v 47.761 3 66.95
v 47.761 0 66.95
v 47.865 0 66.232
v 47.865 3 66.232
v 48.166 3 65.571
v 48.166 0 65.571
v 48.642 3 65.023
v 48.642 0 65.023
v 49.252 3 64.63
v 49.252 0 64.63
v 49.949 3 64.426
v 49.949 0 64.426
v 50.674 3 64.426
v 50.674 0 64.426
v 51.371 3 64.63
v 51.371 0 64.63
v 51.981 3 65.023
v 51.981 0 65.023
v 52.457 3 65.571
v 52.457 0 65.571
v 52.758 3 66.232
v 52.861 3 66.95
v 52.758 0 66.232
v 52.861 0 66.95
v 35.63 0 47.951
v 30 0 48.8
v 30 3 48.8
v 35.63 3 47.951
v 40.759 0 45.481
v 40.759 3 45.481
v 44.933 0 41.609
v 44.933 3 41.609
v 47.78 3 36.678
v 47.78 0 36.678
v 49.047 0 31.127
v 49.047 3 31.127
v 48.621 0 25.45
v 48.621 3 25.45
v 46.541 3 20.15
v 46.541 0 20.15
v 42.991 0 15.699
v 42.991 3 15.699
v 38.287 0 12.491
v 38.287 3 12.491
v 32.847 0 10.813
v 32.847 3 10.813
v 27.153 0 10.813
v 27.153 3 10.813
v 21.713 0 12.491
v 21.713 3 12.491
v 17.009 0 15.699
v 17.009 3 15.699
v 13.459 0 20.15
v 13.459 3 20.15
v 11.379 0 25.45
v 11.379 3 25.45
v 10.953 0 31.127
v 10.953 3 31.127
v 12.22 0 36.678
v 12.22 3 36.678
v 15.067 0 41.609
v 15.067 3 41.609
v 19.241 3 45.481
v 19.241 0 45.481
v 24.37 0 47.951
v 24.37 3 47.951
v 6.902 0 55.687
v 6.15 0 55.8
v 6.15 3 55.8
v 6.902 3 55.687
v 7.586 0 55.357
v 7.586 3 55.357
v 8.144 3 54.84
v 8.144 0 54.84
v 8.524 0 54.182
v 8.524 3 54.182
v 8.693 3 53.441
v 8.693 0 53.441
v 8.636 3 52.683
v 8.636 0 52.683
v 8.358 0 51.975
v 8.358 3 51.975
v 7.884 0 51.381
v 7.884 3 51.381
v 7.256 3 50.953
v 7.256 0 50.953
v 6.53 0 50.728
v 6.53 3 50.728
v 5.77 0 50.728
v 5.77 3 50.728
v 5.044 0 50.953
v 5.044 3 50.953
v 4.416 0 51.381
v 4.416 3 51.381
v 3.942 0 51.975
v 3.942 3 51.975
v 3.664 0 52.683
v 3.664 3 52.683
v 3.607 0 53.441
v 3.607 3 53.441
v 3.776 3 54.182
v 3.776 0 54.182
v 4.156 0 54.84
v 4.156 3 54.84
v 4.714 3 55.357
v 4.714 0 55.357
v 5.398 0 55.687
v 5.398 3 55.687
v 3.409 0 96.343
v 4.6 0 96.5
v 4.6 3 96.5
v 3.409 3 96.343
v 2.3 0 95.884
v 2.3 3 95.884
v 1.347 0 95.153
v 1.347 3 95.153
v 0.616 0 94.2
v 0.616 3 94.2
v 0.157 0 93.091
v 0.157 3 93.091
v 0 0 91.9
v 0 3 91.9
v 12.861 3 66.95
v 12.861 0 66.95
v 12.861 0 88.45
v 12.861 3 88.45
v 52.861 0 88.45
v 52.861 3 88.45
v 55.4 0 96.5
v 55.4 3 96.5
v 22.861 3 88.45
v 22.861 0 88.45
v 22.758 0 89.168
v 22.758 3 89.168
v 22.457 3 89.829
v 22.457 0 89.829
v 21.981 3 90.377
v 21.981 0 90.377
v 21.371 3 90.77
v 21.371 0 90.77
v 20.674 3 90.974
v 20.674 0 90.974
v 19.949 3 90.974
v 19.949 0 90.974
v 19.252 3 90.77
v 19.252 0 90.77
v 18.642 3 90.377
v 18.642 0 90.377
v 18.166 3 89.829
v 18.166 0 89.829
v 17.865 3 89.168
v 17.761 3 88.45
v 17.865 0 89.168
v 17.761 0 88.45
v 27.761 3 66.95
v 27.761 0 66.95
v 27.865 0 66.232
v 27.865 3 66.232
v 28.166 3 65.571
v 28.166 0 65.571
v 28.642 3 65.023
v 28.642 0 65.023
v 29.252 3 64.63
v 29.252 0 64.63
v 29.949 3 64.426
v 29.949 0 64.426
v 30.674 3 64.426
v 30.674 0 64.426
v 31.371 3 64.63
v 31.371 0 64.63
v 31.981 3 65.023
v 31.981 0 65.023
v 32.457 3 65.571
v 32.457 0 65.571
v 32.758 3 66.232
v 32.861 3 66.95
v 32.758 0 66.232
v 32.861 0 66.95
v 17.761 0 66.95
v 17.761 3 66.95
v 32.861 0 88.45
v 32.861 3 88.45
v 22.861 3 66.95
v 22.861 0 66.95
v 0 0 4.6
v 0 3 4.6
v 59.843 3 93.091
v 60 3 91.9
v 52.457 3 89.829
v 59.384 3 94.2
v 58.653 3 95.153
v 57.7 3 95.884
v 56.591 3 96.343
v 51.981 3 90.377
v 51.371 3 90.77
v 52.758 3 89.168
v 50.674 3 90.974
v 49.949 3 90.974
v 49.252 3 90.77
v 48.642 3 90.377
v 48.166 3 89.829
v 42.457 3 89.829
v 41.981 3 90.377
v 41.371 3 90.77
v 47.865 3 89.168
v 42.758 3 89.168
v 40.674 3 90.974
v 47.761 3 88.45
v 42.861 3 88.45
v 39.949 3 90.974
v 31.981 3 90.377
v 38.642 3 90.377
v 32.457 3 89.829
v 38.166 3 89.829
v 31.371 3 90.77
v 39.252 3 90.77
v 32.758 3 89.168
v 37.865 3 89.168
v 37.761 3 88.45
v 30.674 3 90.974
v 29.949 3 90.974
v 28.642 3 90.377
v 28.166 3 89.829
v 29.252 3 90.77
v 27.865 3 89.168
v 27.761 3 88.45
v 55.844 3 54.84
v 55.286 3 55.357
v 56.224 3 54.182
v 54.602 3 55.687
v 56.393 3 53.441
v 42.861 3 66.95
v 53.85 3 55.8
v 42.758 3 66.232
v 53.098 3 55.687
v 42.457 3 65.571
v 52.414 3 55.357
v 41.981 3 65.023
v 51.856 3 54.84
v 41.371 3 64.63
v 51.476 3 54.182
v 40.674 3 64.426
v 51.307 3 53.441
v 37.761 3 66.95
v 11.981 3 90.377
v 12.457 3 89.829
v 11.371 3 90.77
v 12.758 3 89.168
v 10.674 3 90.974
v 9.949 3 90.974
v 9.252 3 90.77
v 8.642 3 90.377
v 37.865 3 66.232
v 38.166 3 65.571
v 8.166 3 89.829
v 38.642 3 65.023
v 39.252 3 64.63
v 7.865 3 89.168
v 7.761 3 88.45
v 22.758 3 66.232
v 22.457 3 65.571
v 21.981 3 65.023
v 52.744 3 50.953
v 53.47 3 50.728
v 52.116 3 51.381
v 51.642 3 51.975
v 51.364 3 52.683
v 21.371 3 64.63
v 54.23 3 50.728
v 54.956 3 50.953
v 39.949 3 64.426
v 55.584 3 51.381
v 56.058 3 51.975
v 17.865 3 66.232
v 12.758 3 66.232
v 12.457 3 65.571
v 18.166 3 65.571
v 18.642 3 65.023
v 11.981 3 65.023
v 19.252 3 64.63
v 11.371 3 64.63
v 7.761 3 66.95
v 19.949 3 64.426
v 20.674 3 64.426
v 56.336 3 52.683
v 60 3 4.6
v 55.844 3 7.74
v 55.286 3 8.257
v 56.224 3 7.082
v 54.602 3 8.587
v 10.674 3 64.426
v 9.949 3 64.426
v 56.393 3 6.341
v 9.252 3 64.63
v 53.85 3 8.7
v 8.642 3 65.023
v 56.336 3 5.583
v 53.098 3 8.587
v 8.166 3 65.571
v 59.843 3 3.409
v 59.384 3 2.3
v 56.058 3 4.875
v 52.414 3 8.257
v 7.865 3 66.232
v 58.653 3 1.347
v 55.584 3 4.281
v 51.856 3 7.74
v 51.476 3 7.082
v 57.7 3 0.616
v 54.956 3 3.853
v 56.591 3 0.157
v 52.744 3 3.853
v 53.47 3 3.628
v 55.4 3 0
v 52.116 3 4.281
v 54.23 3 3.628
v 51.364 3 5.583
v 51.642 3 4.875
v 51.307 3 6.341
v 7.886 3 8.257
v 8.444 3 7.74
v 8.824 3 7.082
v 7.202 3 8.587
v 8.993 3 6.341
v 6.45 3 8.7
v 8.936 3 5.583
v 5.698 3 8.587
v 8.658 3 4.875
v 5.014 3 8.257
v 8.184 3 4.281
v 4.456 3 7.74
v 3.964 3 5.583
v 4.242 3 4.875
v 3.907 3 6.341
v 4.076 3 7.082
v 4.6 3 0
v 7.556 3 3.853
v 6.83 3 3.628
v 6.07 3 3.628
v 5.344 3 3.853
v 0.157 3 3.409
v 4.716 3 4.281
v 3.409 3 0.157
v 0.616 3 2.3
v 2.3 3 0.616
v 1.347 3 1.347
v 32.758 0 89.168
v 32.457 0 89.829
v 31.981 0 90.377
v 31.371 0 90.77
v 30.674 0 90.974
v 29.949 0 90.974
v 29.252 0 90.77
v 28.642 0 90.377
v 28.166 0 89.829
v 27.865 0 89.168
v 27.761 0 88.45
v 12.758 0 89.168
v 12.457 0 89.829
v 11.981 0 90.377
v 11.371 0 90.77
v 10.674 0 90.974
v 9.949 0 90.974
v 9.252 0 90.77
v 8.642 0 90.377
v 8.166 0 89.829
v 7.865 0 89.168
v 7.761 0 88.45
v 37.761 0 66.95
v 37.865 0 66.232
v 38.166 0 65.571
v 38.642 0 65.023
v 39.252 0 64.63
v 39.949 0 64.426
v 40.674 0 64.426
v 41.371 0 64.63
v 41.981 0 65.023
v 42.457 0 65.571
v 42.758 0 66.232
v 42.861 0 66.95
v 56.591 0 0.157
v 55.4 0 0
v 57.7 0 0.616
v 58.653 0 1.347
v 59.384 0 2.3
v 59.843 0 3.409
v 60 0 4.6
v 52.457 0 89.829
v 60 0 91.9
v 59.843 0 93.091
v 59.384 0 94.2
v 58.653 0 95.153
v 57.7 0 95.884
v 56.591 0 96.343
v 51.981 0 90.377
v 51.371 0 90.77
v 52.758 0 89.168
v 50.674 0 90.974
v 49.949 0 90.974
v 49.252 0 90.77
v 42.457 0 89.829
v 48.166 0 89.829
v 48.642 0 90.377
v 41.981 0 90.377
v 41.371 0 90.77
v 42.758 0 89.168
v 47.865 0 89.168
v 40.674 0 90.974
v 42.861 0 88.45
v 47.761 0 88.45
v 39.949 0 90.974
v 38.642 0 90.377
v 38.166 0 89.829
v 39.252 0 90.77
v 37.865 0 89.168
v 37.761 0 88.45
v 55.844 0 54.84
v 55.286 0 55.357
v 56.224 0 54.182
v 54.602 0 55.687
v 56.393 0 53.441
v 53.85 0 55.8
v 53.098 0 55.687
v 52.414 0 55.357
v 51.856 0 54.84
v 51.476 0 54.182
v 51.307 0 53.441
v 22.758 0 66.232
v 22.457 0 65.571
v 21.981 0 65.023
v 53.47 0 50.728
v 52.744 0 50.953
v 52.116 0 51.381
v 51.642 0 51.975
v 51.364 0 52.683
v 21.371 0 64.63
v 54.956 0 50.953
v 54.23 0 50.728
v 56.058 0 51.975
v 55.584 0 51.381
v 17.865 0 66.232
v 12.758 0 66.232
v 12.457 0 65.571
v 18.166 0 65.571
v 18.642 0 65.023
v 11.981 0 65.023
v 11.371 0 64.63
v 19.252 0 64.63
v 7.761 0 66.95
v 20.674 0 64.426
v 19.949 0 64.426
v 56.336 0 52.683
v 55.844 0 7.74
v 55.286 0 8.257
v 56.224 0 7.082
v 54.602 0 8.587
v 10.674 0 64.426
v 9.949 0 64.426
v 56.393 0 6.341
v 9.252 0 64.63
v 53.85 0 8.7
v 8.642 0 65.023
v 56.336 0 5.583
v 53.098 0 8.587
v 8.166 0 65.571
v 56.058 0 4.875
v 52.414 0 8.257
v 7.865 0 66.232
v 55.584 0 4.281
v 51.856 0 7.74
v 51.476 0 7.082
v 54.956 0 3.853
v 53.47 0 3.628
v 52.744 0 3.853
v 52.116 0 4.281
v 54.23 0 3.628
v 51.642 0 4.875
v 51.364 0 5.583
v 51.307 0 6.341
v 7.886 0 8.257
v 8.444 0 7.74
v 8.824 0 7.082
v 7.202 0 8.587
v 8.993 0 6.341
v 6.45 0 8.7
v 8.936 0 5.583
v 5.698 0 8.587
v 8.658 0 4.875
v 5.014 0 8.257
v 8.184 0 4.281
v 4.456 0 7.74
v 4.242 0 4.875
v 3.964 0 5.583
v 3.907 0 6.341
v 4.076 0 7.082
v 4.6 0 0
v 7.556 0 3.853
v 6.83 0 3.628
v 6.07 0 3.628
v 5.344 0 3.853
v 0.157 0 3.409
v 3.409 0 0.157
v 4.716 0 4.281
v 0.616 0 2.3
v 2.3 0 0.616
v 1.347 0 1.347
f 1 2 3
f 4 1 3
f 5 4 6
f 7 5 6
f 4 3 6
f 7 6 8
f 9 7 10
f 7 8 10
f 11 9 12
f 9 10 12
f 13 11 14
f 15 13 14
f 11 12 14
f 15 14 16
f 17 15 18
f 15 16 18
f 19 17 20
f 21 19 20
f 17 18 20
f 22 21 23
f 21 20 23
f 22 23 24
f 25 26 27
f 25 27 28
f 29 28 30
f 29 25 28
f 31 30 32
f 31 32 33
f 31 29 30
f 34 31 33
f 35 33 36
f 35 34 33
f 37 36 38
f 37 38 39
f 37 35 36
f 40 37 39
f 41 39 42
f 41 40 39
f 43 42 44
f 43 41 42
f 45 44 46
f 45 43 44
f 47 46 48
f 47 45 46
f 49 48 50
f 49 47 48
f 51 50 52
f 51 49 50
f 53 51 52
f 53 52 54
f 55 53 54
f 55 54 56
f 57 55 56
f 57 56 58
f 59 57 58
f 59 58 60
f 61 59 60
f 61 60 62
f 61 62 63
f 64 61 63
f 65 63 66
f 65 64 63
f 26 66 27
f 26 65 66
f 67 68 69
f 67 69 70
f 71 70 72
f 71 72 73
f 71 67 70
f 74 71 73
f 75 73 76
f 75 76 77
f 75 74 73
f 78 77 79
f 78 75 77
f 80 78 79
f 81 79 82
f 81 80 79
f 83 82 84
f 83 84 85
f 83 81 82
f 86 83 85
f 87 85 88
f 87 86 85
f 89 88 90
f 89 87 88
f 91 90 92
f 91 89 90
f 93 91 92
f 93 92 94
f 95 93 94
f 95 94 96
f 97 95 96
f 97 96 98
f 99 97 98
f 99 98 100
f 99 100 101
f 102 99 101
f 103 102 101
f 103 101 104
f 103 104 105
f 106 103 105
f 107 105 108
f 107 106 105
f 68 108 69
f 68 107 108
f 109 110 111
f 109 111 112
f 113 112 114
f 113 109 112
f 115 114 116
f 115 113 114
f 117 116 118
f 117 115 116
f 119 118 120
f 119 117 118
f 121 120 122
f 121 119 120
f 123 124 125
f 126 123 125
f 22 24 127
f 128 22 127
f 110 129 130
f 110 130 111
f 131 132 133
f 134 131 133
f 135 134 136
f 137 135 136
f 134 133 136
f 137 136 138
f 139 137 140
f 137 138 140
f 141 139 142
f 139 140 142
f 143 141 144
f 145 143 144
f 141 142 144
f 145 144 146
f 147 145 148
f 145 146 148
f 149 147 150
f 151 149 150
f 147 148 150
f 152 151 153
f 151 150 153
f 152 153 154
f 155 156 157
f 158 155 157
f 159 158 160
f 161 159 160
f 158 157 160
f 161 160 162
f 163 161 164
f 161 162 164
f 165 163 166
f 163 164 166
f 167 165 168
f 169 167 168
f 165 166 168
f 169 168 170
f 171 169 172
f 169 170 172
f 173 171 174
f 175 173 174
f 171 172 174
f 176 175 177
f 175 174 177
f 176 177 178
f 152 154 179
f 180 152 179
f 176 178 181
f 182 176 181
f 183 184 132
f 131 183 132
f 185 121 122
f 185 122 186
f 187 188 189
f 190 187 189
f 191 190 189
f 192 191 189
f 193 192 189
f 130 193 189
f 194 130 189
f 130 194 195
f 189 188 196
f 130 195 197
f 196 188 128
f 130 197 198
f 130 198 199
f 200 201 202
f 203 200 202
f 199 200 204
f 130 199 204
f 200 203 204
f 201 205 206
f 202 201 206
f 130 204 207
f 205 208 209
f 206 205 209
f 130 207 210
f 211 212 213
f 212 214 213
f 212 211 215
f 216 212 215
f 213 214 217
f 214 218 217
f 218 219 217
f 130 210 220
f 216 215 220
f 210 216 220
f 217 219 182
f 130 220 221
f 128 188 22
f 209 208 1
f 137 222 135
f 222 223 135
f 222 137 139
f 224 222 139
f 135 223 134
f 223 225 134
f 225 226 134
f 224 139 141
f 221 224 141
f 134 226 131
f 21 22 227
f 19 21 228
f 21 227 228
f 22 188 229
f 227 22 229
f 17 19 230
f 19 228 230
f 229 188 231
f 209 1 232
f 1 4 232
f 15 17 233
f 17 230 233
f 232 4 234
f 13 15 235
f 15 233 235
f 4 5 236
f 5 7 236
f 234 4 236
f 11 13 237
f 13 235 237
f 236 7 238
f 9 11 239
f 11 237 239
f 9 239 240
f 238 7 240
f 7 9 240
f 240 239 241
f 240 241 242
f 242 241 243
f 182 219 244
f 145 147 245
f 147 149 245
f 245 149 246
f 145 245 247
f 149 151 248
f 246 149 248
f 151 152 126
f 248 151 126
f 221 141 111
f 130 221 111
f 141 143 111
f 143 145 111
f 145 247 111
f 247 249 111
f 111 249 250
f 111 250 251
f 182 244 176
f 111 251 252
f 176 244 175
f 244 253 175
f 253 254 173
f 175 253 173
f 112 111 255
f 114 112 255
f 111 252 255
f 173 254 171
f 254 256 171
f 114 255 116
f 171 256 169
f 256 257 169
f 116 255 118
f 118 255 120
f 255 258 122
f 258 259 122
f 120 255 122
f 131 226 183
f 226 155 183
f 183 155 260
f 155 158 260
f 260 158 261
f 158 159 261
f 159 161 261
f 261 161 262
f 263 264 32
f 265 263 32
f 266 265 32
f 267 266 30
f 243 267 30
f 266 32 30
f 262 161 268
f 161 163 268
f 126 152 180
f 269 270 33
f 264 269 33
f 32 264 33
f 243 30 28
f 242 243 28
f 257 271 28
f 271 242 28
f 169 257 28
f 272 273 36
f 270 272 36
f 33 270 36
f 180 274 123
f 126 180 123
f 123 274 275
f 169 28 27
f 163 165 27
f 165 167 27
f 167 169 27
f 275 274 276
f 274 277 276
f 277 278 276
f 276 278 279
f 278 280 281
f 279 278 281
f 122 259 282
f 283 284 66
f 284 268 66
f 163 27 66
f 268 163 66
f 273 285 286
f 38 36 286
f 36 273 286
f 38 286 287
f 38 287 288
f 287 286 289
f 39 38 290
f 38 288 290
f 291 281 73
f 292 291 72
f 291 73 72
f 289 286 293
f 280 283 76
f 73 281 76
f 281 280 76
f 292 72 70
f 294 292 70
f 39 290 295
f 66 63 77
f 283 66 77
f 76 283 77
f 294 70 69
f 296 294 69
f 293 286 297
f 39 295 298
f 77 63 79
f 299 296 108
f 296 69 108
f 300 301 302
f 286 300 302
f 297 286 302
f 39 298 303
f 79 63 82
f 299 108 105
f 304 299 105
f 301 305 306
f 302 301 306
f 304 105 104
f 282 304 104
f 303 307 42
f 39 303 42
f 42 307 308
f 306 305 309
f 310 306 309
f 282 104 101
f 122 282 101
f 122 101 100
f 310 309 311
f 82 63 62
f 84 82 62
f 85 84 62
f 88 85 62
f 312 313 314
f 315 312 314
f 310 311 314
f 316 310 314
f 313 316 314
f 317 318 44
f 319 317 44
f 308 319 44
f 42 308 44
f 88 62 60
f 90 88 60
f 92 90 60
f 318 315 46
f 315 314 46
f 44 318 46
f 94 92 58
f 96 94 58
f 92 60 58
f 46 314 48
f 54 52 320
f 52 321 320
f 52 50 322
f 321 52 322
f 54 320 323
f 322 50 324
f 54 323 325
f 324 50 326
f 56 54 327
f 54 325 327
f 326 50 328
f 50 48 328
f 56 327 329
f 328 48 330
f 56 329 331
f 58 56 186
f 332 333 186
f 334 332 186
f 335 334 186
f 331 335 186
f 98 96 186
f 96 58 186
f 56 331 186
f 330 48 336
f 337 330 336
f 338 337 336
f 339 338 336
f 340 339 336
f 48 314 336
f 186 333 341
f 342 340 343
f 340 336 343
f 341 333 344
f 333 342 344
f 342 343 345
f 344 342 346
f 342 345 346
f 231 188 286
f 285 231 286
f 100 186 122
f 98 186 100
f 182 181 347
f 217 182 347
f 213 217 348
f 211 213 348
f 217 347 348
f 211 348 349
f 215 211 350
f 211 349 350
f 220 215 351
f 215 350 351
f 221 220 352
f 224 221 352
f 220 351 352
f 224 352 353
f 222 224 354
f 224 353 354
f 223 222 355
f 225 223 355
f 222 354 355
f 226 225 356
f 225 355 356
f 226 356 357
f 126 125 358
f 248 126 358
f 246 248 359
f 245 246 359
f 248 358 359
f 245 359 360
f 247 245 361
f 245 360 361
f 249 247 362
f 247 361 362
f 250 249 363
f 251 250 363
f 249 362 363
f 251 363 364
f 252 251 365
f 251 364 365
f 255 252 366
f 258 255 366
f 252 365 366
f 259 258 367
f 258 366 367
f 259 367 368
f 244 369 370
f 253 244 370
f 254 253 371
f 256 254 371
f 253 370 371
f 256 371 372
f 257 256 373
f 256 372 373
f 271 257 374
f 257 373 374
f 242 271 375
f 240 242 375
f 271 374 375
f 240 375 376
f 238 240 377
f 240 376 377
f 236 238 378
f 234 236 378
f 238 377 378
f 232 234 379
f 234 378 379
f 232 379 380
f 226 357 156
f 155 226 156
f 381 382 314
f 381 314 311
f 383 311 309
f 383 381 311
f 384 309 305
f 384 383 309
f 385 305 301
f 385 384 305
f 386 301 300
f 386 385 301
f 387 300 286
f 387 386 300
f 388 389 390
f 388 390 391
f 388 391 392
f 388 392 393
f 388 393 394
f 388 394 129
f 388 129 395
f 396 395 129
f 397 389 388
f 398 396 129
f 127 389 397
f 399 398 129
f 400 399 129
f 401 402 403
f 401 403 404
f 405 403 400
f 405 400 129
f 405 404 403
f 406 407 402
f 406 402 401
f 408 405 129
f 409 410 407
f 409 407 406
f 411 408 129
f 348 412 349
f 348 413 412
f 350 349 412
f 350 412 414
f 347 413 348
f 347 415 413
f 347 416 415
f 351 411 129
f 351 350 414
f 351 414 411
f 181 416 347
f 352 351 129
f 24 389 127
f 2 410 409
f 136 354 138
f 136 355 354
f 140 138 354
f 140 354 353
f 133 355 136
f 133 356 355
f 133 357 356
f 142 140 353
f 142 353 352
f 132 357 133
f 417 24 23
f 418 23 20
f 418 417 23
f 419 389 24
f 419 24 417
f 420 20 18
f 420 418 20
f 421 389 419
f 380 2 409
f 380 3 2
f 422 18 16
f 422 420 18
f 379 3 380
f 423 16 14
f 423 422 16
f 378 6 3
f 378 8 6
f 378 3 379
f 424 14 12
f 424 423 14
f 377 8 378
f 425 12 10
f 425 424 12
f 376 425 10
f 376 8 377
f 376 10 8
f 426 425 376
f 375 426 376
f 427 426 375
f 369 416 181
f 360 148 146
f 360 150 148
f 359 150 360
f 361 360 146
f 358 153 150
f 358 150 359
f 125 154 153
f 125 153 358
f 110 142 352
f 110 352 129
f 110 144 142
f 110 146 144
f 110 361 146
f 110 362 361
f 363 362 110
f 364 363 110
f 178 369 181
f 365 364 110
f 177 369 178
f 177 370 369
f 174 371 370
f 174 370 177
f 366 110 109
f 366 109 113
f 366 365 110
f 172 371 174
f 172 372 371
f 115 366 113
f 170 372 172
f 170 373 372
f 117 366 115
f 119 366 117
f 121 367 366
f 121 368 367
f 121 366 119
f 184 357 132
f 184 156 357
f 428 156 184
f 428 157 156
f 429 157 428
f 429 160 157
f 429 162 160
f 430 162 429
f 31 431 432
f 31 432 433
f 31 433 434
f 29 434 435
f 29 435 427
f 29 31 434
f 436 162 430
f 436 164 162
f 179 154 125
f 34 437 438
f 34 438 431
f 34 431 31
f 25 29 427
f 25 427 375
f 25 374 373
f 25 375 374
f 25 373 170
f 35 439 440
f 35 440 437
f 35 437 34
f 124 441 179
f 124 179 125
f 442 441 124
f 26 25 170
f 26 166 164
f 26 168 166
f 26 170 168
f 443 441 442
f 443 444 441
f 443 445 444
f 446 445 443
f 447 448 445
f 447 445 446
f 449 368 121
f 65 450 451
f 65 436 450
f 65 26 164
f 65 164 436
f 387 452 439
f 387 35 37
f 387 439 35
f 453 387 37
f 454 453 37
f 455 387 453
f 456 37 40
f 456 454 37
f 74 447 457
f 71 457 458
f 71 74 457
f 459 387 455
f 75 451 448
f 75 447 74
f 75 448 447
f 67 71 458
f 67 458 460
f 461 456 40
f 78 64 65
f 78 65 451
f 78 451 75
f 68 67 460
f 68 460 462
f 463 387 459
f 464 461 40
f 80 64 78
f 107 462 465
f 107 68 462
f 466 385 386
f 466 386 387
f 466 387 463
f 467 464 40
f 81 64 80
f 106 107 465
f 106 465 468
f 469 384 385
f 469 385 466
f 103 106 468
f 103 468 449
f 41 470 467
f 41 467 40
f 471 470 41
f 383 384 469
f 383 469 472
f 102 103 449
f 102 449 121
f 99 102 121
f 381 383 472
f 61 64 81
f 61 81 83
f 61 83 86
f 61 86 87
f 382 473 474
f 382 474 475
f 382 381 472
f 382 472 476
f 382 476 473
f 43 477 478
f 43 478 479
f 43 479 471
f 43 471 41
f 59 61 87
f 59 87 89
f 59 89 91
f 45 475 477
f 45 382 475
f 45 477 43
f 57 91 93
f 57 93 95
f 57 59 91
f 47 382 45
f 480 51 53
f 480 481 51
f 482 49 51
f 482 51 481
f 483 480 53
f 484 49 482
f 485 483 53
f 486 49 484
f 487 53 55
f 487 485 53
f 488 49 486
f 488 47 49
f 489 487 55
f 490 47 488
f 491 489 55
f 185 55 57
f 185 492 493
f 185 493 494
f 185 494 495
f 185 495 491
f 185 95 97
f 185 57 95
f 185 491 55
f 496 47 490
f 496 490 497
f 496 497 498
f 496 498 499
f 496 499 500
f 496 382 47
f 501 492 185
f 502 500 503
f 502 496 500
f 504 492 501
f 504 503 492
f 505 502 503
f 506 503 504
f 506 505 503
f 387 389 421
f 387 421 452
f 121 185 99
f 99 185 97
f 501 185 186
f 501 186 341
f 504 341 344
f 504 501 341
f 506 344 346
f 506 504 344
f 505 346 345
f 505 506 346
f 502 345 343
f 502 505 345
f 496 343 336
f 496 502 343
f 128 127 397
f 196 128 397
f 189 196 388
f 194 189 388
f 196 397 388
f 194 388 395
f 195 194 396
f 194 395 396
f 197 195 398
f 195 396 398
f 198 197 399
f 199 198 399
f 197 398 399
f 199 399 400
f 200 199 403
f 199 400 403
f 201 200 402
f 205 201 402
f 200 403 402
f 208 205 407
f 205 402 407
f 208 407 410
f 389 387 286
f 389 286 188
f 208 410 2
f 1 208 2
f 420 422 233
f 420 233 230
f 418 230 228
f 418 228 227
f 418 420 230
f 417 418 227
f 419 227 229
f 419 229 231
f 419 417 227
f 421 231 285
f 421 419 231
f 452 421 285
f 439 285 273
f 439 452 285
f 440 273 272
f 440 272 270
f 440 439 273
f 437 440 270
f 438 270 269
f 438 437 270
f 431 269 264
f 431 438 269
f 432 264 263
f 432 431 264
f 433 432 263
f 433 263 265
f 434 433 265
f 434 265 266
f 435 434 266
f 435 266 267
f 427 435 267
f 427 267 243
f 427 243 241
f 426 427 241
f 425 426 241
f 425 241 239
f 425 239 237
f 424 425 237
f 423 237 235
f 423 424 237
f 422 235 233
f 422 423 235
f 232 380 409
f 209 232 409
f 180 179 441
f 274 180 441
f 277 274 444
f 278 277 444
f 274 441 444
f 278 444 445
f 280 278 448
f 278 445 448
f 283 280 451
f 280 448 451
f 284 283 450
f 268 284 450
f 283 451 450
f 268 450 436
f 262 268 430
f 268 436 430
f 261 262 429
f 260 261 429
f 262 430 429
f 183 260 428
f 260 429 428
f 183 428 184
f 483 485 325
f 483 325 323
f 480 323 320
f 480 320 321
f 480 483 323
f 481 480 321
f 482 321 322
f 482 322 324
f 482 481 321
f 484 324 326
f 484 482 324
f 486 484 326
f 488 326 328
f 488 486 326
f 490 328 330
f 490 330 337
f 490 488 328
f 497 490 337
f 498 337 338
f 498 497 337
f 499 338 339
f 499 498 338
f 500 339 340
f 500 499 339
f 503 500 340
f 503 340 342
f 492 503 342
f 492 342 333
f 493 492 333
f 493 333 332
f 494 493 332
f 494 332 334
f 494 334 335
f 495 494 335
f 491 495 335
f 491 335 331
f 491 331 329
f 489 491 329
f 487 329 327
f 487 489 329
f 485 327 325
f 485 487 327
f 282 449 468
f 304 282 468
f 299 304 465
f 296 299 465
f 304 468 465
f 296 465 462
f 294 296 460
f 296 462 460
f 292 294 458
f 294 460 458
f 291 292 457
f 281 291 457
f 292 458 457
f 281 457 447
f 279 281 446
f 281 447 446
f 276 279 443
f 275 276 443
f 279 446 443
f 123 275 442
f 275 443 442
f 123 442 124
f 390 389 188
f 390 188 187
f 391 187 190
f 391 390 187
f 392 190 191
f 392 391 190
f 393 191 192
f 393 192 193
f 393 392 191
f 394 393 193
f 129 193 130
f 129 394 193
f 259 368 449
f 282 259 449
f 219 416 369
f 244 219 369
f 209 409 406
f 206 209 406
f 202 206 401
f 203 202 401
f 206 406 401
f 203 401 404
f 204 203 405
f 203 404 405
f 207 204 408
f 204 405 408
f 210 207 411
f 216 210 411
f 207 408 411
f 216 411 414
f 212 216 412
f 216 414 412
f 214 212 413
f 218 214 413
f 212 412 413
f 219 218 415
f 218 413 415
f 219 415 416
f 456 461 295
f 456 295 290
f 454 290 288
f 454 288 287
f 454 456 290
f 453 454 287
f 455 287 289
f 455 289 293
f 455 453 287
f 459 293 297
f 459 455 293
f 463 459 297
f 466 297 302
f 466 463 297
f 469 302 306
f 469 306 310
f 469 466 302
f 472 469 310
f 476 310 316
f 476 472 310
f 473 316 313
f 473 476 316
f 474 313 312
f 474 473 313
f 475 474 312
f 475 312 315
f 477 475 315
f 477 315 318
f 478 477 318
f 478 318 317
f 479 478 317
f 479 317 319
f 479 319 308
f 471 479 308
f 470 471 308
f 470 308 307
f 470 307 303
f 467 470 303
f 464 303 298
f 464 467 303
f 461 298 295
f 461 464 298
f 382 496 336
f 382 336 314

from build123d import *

# Parameters (mm, degrees)
SKETCH_1_R      = 2.55
SKETCH_1_R_2    = 19.1
EXTRUDE_1_DEPTH = 3


with BuildPart() as part:
    # Эскиз1 → Бобышка-Вытянуть1 (new body)
    with BuildSketch(Plane(origin=(0, 0, 0), x_dir=(1, 0, 0), z_dir=(0, 1, 0))):
        with BuildLine():
            Line((4.6, 0), (55.4, 0))
            ThreePointArc((55.4, 0), (58.652691193, -1.347308807), (60, -4.6))
            Line((60, -4.6), (60, -91.9))
            ThreePointArc((60, -91.9), (58.652691193, -95.152691193), (55.4, -96.5))
            Line((55.4, -96.5), (4.6, -96.5))
            ThreePointArc((4.6, -96.5), (1.347308807, -95.152691193), (0, -91.9))
            Line((0, -91.9), (0, -4.6))
            ThreePointArc((0, -4.6), (1.347308807, -1.347308807), (4.6, 0))
        make_face()
        with Locations(Location((6.45, -6.15, 0), (0, 0, 270))):
            Circle(SKETCH_1_R, mode=Mode.SUBTRACT)
        with Locations(Location((53.85, -6.15, 0), (0, 0, 270))):
            Circle(SKETCH_1_R, mode=Mode.SUBTRACT)
        with Locations(Location((6.15, -53.25, 0), (0, 0, 270))):
            Circle(SKETCH_1_R, mode=Mode.SUBTRACT)
        with Locations(Location((53.85, -53.25, 0), (0, 0, 270))):
            Circle(SKETCH_1_R, mode=Mode.SUBTRACT)
        with Locations(Location((30, -29.7, 0), (0, 0, 270))):
            Circle(SKETCH_1_R_2, mode=Mode.SUBTRACT)
        with BuildLine():
            Line((12.861404853, -66.95), (12.861404853, -88.45))
            ThreePointArc((12.861404853, -88.45), (10.311404853, -91), (7.761404853, -88.45))
            Line((7.761404853, -88.45), (7.761404853, -66.95))
            ThreePointArc((7.761404853, -66.95), (10.311404853, -64.4), (12.861404853, -66.95))
        make_face(mode=Mode.SUBTRACT)
        with BuildLine():
            Line((22.861404853, -66.95), (22.861404853, -88.45))
            ThreePointArc((22.861404853, -88.45), (20.311404853, -91), (17.761404853, -88.45))
            Line((17.761404853, -88.45), (17.761404853, -66.95))
            ThreePointArc((17.761404853, -66.95), (20.311404853, -64.4), (22.861404853, -66.95))
        make_face(mode=Mode.SUBTRACT)
        with BuildLine():
            Line((32.861404853, -66.95), (32.861404853, -88.45))
            ThreePointArc((32.861404853, -88.45), (30.311404853, -91), (27.761404853, -88.45))
            Line((27.761404853, -88.45), (27.761404853, -66.95))
            ThreePointArc((27.761404853, -66.95), (30.311404853, -64.4), (32.861404853, -66.95))
        make_face(mode=Mode.SUBTRACT)
        with BuildLine():
            Line((42.861404853, -66.95), (42.861404853, -88.45))
            ThreePointArc((42.861404853, -88.45), (40.311404853, -91), (37.761404853, -88.45))
            Line((37.761404853, -88.45), (37.761404853, -66.95))
            ThreePointArc((37.761404853, -66.95), (40.311404853, -64.4), (42.861404853, -66.95))
        make_face(mode=Mode.SUBTRACT)
        with BuildLine():
            Line((52.861404853, -66.95), (52.861404853, -88.45))
            ThreePointArc((52.861404853, -88.45), (50.311404853, -91), (47.761404853, -88.45))
            Line((47.761404853, -88.45), (47.761404853, -66.95))
            ThreePointArc((47.761404853, -66.95), (50.311404853, -64.4), (52.861404853, -66.95))
        make_face(mode=Mode.SUBTRACT)
    extrude(amount=EXTRUDE_1_DEPTH)


solid = part.part
